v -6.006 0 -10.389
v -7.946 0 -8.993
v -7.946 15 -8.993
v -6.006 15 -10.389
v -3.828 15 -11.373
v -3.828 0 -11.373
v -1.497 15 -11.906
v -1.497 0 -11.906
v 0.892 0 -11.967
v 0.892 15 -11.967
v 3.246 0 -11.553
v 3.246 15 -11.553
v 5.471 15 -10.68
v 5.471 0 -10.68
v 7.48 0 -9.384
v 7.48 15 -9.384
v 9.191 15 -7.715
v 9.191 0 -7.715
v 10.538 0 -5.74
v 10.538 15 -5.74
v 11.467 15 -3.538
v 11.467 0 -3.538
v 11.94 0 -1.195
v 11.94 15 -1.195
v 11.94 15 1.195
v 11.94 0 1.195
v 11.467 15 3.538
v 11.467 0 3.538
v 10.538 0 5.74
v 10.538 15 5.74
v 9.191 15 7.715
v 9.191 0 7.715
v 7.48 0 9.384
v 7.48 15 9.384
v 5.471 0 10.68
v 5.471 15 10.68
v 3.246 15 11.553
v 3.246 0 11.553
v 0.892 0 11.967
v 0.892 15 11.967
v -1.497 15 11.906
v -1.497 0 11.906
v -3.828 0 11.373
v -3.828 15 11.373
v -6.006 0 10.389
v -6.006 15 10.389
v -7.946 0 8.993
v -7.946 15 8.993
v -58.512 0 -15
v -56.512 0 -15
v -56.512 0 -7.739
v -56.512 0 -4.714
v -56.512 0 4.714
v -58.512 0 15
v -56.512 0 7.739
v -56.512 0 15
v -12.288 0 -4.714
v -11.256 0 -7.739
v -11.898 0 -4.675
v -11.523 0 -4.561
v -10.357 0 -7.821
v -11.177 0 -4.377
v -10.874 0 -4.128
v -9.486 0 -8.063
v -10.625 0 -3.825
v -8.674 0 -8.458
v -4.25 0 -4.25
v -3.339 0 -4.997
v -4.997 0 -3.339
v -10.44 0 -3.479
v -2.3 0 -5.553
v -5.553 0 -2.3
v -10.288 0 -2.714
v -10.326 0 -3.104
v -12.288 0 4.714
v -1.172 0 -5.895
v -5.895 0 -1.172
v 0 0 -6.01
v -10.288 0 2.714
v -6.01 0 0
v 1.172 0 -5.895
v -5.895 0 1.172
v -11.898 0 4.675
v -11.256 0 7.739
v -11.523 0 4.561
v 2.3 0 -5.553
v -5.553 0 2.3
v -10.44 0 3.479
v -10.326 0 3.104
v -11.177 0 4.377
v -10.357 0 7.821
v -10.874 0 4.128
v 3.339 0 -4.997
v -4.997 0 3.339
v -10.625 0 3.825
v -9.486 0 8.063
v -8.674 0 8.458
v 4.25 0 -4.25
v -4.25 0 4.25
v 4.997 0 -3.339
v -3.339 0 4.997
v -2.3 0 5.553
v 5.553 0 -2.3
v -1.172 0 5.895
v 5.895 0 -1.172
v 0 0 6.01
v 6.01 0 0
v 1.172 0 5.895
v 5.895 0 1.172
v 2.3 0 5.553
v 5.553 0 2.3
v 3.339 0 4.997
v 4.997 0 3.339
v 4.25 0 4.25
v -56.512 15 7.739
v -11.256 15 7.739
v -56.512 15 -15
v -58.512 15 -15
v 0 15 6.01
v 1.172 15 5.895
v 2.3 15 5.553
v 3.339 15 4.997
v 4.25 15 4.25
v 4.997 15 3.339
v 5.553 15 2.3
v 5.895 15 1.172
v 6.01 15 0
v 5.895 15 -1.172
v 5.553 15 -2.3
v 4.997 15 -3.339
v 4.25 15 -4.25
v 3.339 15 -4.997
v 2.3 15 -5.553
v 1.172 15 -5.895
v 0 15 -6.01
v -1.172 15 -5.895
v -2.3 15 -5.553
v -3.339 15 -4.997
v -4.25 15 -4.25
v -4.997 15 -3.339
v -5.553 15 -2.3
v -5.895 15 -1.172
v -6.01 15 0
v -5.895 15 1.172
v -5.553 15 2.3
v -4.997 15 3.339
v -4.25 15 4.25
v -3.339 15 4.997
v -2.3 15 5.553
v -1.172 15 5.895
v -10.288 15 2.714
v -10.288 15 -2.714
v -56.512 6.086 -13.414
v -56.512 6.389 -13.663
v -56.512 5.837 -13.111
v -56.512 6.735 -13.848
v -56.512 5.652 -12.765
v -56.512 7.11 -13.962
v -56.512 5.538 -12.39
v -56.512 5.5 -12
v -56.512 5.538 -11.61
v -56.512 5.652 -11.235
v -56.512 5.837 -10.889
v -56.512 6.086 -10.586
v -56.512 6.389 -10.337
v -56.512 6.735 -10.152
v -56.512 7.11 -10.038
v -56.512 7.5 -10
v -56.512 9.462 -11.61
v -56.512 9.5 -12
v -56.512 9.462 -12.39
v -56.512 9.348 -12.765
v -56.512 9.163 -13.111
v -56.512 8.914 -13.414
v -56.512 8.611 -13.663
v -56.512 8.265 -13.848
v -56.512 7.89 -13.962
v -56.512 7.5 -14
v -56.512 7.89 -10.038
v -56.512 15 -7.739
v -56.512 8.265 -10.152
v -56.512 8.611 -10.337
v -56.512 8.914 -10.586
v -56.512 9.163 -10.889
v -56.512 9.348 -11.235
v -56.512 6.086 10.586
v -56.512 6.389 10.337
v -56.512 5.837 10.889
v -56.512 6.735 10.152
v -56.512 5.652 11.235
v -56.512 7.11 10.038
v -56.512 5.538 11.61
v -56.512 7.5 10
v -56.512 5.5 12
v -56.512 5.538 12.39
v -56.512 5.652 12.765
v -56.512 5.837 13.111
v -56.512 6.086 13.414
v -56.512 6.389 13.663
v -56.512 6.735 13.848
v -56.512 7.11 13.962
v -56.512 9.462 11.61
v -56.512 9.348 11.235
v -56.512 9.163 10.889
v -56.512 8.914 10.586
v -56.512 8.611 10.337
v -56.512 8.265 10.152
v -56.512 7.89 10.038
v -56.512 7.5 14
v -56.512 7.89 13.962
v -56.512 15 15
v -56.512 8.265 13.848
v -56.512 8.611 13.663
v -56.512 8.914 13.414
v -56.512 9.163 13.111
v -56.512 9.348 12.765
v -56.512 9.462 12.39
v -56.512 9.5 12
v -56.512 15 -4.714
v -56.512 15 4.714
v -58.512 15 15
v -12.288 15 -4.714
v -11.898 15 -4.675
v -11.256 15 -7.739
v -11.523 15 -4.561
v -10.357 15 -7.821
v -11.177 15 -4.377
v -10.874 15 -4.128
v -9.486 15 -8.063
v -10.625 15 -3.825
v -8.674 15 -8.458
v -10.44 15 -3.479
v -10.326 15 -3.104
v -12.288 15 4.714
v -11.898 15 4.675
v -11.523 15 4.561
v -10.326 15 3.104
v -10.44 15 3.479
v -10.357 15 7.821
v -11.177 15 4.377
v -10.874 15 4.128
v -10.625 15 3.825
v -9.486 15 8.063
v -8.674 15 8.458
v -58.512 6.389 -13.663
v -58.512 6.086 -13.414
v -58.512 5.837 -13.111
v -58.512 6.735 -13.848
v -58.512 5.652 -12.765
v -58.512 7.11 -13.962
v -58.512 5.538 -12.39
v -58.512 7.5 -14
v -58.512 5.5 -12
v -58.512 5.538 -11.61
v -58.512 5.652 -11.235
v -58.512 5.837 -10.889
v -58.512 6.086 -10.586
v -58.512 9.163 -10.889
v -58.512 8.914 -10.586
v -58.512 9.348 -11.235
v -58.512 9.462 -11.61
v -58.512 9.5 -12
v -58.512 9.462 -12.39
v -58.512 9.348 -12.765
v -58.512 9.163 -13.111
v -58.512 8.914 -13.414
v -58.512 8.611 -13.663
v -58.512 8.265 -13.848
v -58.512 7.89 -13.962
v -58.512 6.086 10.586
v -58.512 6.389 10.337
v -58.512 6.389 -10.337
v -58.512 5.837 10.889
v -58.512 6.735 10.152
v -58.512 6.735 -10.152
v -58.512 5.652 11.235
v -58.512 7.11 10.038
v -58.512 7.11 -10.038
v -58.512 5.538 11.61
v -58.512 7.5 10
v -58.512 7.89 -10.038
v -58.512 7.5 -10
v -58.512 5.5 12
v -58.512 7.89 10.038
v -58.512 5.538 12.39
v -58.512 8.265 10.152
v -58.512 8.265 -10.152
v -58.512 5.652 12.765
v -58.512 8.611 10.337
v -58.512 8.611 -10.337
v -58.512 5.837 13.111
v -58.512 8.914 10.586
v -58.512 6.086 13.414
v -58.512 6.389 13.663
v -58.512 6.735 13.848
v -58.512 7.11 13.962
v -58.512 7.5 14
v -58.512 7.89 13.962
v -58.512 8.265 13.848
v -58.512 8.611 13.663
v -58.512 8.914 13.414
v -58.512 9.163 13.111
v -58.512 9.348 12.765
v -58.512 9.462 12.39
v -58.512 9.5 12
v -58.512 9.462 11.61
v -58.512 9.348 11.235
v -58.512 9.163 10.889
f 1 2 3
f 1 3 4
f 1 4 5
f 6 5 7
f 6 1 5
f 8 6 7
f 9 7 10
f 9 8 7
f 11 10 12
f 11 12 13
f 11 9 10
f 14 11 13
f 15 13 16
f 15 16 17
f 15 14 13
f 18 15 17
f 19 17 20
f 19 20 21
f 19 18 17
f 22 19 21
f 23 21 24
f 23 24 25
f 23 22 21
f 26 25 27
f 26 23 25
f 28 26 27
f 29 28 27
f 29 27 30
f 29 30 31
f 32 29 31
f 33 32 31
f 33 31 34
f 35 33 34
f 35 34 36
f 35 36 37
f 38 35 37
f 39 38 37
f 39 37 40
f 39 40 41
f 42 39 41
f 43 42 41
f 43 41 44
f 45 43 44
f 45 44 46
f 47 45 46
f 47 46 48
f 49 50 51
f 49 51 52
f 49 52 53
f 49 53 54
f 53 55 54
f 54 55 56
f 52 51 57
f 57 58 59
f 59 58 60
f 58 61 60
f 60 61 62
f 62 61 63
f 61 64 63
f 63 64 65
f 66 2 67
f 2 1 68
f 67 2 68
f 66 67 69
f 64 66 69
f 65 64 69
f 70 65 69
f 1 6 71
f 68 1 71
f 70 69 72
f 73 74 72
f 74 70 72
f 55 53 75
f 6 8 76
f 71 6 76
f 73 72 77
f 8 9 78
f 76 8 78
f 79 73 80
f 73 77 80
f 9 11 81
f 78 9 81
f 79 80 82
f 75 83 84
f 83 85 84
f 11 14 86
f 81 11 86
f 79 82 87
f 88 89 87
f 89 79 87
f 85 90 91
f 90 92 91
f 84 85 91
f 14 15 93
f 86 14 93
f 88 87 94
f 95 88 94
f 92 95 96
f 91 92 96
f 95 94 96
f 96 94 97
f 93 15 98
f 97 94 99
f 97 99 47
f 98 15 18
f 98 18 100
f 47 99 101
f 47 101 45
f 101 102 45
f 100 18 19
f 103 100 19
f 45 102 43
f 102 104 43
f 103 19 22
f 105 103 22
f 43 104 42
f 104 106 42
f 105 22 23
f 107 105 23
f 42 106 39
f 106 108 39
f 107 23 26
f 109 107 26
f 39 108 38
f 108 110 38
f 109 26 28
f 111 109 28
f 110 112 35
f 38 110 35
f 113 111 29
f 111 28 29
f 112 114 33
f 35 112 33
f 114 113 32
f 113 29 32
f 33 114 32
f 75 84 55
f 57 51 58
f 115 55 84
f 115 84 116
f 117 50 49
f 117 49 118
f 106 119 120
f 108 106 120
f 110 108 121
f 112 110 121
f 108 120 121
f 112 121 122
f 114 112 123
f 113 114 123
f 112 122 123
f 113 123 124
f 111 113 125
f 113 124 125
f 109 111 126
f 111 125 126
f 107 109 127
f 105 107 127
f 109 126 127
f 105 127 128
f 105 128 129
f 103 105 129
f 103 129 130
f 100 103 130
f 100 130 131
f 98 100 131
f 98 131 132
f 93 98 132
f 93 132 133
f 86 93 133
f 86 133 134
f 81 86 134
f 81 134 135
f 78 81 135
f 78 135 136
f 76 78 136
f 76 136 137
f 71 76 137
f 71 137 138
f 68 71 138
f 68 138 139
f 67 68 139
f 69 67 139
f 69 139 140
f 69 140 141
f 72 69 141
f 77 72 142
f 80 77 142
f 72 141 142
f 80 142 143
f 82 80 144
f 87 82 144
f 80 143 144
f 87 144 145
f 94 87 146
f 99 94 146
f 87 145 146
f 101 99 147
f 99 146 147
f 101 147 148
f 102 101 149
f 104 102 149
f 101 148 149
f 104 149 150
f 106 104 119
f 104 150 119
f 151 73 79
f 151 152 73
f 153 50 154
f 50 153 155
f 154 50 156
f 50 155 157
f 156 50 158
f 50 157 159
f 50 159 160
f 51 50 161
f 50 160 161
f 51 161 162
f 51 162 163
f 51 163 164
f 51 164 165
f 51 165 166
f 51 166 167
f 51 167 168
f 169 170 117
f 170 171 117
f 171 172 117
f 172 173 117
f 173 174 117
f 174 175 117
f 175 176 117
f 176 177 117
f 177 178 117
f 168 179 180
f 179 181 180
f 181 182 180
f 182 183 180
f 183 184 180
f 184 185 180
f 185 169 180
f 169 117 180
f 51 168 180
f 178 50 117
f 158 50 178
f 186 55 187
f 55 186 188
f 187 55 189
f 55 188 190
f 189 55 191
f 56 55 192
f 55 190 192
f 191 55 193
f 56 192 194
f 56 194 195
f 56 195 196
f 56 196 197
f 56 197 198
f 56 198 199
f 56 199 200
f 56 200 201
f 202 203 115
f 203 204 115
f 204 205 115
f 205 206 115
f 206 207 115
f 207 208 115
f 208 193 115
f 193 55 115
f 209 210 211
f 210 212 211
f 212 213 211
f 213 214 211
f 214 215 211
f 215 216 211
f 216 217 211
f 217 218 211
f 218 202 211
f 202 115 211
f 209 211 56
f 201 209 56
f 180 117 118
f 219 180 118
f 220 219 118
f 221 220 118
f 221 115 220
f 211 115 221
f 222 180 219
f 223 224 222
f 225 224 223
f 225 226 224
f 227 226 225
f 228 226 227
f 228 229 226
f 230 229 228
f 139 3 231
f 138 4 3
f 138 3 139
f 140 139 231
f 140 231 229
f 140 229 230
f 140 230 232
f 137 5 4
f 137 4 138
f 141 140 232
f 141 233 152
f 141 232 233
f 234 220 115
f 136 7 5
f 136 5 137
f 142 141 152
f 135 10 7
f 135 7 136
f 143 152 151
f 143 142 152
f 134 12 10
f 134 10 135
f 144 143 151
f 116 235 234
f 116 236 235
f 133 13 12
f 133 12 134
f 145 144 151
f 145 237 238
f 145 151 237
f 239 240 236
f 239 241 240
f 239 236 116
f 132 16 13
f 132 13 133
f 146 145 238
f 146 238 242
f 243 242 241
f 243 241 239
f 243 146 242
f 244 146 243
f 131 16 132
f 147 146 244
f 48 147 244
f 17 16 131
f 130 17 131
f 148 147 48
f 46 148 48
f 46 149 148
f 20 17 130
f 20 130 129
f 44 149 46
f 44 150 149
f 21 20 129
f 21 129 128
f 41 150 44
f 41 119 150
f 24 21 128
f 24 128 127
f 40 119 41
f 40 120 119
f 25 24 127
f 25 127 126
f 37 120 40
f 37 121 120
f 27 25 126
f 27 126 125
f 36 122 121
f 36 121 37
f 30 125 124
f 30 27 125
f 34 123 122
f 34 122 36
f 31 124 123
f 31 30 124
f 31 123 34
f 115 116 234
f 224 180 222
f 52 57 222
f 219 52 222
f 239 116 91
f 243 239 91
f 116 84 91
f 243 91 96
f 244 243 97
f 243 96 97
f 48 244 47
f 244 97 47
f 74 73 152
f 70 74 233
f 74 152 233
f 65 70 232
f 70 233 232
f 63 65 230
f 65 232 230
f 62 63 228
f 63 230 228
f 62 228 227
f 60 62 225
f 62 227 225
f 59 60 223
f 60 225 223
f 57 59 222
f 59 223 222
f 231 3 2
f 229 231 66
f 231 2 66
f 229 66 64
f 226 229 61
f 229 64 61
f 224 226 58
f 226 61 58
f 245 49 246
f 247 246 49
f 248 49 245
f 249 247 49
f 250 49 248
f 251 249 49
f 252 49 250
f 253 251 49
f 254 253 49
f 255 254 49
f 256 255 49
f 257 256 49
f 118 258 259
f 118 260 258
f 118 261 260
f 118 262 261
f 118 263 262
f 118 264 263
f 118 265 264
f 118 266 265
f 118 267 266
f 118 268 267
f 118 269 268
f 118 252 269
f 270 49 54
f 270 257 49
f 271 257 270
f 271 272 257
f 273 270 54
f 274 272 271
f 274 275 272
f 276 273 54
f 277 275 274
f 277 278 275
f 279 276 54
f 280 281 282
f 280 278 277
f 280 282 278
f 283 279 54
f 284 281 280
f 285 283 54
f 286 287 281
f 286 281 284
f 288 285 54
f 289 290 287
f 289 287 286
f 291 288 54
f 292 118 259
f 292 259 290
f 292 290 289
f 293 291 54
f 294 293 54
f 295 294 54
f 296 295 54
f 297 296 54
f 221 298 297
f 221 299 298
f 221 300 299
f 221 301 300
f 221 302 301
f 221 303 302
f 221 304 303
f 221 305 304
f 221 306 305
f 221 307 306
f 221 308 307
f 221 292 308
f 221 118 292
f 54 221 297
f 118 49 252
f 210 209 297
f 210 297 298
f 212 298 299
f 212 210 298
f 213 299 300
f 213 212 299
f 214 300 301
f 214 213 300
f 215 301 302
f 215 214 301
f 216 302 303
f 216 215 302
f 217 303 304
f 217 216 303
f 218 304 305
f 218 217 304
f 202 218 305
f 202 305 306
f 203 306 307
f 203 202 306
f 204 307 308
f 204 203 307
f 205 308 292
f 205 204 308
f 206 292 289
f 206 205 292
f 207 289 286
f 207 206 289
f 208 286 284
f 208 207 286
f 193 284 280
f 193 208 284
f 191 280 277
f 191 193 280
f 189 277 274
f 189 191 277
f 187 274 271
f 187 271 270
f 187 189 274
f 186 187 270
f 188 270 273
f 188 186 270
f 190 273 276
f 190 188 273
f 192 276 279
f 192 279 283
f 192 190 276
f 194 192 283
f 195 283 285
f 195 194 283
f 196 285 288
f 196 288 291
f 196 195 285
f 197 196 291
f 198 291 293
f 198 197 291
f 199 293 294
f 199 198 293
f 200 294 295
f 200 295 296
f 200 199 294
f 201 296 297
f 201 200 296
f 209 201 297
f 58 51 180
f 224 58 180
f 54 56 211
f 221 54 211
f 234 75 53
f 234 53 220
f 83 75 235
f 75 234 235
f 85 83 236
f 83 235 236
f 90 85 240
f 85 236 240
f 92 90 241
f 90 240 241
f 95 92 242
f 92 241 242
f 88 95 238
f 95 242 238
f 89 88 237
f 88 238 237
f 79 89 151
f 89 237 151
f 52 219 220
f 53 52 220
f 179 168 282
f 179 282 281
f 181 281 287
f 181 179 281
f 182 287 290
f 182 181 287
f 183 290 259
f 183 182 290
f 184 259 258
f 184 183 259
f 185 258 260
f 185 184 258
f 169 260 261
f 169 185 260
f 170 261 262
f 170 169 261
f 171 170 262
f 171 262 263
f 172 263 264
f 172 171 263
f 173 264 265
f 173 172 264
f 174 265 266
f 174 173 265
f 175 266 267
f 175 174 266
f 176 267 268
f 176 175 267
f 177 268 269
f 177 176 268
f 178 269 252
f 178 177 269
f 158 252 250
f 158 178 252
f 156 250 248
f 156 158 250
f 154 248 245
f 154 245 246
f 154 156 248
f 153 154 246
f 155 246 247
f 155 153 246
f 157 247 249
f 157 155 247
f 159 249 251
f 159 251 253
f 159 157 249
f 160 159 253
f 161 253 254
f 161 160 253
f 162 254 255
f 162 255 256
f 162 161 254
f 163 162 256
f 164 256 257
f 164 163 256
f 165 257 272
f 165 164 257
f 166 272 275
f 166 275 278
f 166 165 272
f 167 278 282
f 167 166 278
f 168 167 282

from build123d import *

# Parameters (mm, degrees)
EXTRUDE_1_DEPTH     = 15
SKETCH_4_W          = 1.562441002
SKETCH_4_H          = 15
SKETCH_4_W_2        = 6.177038061
EXTRUDE_3_DEPTH     = 5
SKETCH_2_R          = 6.01
CUT_EXTRUDE_2_DEPTH = 200
SKETCH_7_W          = 3.025917145
SKETCH_7_H          = 15
EXTRUDE_4_DEPTH     = 46.224
FILLET_1_R          = 2
FILLET_2_R          = 5
SKETCH_8_W          = 7.260520937
SKETCH_8_H          = 15
SKETCH_8_R          = 2
SKETCH_8_W_2        = 19.713561918
SKETCH_8_W_3        = 3.025917145
EXTRUDE_5_DEPTH     = 2


with BuildPart() as part:
    # 草图1 → 凸台-拉伸1 (new body)
    with BuildSketch(Plane(origin=(0, 0, 0), x_dir=(1, 0, 0), z_dir=(0, 1, 0))):
        with BuildLine():
            Line((-10.28806108, -6.177038061), (-10.28806108, 6.177038061))
            ThreePointArc((-10.28806108, 6.177038061), (12, 0), (-10.28806108, -6.177038061))
        make_face()
    extrude(amount=EXTRUDE_1_DEPTH)

    # 草图4 → 凸台-拉伸3 (add)
    with BuildSketch(Plane.ZY.offset(10.28806108)):
        with Locations((6.958258562, 7.5)):
            Rectangle(SKETCH_4_W, SKETCH_4_H)
        with Locations((-6.958258562, 7.5)):
            Rectangle(SKETCH_4_W, SKETCH_4_H)
        with Locations((-3.088519031, 7.5)):
            Rectangle(SKETCH_4_W_2, SKETCH_4_H)
        with Locations((3.088519031, 7.5)):
            Rectangle(SKETCH_4_W_2, SKETCH_4_H)
    extrude(amount=-EXTRUDE_3_DEPTH)

    # 草图2 → 切除-拉伸2 (cut)
    with BuildSketch(Plane(origin=(0, 15, 0), x_dir=(1, 0, 0), z_dir=(0, 1, 0))):
        with Locations(Location((0, 0, 0), (0, 0, 270))):
            Circle(SKETCH_2_R)
    extrude(amount=-CUT_EXTRUDE_2_DEPTH, mode=Mode.SUBTRACT)

    # 草图7 → 凸台-拉伸4 (add)
    with BuildSketch(Plane.ZY.offset(10.28806108)):
        with Locations((6.226520491, 7.5)):
            Rectangle(SKETCH_7_W, SKETCH_7_H)
        with Locations((-6.226520491, 7.5)):
            Rectangle(SKETCH_7_W, SKETCH_7_H)
    extrude(amount=EXTRUDE_4_DEPTH)

    # 圆角1
    fillet_1_edges = [part.edges().sort_by_distance(p)[0] for p in [
        (-10.28806108, 7.5, 4.713561918),
        (-10.28806108, 7.5, -4.713561918),
    ]]
    fillet(fillet_1_edges, radius=FILLET_1_R)

    # 圆角2
    fillet_2_edges = [part.edges().sort_by_distance(p)[0] for p in [
        (-9.170630504, 7.5, -7.739479063),
        (-9.170630504, 7.5, 7.739479063),
    ]]
    fillet(fillet_2_edges, radius=FILLET_2_R)

    # 草图8 → 凸台-拉伸5 (add)
    # profile 1 of 3: a face of its own
    with BuildSketch(Plane.ZY.offset(56.51206108)):
        with Locations((11.369739532, 7.5)):
            Rectangle(SKETCH_8_W, SKETCH_8_H)
        with Locations((12, 7.5)):
            Circle(SKETCH_8_R, mode=Mode.SUBTRACT)
    # profile 2 of 3: a face of its own
    with BuildSketch(Plane.ZY.offset(56.51206108)):
        with Locations((-5.143219041, 7.5)):
            Rectangle(SKETCH_8_W_2, SKETCH_8_H)
        with Locations((-12, 7.5)):
            Circle(SKETCH_8_R, mode=Mode.SUBTRACT)
    # profile 3 of 3: a face of its own
    with BuildSketch(Plane.ZY.offset(56.51206108)):
        with Locations((6.226520491, 7.5)):
            Rectangle(SKETCH_8_W_3, SKETCH_8_H)
    extrude(amount=EXTRUDE_5_DEPTH)


solid = part.part
